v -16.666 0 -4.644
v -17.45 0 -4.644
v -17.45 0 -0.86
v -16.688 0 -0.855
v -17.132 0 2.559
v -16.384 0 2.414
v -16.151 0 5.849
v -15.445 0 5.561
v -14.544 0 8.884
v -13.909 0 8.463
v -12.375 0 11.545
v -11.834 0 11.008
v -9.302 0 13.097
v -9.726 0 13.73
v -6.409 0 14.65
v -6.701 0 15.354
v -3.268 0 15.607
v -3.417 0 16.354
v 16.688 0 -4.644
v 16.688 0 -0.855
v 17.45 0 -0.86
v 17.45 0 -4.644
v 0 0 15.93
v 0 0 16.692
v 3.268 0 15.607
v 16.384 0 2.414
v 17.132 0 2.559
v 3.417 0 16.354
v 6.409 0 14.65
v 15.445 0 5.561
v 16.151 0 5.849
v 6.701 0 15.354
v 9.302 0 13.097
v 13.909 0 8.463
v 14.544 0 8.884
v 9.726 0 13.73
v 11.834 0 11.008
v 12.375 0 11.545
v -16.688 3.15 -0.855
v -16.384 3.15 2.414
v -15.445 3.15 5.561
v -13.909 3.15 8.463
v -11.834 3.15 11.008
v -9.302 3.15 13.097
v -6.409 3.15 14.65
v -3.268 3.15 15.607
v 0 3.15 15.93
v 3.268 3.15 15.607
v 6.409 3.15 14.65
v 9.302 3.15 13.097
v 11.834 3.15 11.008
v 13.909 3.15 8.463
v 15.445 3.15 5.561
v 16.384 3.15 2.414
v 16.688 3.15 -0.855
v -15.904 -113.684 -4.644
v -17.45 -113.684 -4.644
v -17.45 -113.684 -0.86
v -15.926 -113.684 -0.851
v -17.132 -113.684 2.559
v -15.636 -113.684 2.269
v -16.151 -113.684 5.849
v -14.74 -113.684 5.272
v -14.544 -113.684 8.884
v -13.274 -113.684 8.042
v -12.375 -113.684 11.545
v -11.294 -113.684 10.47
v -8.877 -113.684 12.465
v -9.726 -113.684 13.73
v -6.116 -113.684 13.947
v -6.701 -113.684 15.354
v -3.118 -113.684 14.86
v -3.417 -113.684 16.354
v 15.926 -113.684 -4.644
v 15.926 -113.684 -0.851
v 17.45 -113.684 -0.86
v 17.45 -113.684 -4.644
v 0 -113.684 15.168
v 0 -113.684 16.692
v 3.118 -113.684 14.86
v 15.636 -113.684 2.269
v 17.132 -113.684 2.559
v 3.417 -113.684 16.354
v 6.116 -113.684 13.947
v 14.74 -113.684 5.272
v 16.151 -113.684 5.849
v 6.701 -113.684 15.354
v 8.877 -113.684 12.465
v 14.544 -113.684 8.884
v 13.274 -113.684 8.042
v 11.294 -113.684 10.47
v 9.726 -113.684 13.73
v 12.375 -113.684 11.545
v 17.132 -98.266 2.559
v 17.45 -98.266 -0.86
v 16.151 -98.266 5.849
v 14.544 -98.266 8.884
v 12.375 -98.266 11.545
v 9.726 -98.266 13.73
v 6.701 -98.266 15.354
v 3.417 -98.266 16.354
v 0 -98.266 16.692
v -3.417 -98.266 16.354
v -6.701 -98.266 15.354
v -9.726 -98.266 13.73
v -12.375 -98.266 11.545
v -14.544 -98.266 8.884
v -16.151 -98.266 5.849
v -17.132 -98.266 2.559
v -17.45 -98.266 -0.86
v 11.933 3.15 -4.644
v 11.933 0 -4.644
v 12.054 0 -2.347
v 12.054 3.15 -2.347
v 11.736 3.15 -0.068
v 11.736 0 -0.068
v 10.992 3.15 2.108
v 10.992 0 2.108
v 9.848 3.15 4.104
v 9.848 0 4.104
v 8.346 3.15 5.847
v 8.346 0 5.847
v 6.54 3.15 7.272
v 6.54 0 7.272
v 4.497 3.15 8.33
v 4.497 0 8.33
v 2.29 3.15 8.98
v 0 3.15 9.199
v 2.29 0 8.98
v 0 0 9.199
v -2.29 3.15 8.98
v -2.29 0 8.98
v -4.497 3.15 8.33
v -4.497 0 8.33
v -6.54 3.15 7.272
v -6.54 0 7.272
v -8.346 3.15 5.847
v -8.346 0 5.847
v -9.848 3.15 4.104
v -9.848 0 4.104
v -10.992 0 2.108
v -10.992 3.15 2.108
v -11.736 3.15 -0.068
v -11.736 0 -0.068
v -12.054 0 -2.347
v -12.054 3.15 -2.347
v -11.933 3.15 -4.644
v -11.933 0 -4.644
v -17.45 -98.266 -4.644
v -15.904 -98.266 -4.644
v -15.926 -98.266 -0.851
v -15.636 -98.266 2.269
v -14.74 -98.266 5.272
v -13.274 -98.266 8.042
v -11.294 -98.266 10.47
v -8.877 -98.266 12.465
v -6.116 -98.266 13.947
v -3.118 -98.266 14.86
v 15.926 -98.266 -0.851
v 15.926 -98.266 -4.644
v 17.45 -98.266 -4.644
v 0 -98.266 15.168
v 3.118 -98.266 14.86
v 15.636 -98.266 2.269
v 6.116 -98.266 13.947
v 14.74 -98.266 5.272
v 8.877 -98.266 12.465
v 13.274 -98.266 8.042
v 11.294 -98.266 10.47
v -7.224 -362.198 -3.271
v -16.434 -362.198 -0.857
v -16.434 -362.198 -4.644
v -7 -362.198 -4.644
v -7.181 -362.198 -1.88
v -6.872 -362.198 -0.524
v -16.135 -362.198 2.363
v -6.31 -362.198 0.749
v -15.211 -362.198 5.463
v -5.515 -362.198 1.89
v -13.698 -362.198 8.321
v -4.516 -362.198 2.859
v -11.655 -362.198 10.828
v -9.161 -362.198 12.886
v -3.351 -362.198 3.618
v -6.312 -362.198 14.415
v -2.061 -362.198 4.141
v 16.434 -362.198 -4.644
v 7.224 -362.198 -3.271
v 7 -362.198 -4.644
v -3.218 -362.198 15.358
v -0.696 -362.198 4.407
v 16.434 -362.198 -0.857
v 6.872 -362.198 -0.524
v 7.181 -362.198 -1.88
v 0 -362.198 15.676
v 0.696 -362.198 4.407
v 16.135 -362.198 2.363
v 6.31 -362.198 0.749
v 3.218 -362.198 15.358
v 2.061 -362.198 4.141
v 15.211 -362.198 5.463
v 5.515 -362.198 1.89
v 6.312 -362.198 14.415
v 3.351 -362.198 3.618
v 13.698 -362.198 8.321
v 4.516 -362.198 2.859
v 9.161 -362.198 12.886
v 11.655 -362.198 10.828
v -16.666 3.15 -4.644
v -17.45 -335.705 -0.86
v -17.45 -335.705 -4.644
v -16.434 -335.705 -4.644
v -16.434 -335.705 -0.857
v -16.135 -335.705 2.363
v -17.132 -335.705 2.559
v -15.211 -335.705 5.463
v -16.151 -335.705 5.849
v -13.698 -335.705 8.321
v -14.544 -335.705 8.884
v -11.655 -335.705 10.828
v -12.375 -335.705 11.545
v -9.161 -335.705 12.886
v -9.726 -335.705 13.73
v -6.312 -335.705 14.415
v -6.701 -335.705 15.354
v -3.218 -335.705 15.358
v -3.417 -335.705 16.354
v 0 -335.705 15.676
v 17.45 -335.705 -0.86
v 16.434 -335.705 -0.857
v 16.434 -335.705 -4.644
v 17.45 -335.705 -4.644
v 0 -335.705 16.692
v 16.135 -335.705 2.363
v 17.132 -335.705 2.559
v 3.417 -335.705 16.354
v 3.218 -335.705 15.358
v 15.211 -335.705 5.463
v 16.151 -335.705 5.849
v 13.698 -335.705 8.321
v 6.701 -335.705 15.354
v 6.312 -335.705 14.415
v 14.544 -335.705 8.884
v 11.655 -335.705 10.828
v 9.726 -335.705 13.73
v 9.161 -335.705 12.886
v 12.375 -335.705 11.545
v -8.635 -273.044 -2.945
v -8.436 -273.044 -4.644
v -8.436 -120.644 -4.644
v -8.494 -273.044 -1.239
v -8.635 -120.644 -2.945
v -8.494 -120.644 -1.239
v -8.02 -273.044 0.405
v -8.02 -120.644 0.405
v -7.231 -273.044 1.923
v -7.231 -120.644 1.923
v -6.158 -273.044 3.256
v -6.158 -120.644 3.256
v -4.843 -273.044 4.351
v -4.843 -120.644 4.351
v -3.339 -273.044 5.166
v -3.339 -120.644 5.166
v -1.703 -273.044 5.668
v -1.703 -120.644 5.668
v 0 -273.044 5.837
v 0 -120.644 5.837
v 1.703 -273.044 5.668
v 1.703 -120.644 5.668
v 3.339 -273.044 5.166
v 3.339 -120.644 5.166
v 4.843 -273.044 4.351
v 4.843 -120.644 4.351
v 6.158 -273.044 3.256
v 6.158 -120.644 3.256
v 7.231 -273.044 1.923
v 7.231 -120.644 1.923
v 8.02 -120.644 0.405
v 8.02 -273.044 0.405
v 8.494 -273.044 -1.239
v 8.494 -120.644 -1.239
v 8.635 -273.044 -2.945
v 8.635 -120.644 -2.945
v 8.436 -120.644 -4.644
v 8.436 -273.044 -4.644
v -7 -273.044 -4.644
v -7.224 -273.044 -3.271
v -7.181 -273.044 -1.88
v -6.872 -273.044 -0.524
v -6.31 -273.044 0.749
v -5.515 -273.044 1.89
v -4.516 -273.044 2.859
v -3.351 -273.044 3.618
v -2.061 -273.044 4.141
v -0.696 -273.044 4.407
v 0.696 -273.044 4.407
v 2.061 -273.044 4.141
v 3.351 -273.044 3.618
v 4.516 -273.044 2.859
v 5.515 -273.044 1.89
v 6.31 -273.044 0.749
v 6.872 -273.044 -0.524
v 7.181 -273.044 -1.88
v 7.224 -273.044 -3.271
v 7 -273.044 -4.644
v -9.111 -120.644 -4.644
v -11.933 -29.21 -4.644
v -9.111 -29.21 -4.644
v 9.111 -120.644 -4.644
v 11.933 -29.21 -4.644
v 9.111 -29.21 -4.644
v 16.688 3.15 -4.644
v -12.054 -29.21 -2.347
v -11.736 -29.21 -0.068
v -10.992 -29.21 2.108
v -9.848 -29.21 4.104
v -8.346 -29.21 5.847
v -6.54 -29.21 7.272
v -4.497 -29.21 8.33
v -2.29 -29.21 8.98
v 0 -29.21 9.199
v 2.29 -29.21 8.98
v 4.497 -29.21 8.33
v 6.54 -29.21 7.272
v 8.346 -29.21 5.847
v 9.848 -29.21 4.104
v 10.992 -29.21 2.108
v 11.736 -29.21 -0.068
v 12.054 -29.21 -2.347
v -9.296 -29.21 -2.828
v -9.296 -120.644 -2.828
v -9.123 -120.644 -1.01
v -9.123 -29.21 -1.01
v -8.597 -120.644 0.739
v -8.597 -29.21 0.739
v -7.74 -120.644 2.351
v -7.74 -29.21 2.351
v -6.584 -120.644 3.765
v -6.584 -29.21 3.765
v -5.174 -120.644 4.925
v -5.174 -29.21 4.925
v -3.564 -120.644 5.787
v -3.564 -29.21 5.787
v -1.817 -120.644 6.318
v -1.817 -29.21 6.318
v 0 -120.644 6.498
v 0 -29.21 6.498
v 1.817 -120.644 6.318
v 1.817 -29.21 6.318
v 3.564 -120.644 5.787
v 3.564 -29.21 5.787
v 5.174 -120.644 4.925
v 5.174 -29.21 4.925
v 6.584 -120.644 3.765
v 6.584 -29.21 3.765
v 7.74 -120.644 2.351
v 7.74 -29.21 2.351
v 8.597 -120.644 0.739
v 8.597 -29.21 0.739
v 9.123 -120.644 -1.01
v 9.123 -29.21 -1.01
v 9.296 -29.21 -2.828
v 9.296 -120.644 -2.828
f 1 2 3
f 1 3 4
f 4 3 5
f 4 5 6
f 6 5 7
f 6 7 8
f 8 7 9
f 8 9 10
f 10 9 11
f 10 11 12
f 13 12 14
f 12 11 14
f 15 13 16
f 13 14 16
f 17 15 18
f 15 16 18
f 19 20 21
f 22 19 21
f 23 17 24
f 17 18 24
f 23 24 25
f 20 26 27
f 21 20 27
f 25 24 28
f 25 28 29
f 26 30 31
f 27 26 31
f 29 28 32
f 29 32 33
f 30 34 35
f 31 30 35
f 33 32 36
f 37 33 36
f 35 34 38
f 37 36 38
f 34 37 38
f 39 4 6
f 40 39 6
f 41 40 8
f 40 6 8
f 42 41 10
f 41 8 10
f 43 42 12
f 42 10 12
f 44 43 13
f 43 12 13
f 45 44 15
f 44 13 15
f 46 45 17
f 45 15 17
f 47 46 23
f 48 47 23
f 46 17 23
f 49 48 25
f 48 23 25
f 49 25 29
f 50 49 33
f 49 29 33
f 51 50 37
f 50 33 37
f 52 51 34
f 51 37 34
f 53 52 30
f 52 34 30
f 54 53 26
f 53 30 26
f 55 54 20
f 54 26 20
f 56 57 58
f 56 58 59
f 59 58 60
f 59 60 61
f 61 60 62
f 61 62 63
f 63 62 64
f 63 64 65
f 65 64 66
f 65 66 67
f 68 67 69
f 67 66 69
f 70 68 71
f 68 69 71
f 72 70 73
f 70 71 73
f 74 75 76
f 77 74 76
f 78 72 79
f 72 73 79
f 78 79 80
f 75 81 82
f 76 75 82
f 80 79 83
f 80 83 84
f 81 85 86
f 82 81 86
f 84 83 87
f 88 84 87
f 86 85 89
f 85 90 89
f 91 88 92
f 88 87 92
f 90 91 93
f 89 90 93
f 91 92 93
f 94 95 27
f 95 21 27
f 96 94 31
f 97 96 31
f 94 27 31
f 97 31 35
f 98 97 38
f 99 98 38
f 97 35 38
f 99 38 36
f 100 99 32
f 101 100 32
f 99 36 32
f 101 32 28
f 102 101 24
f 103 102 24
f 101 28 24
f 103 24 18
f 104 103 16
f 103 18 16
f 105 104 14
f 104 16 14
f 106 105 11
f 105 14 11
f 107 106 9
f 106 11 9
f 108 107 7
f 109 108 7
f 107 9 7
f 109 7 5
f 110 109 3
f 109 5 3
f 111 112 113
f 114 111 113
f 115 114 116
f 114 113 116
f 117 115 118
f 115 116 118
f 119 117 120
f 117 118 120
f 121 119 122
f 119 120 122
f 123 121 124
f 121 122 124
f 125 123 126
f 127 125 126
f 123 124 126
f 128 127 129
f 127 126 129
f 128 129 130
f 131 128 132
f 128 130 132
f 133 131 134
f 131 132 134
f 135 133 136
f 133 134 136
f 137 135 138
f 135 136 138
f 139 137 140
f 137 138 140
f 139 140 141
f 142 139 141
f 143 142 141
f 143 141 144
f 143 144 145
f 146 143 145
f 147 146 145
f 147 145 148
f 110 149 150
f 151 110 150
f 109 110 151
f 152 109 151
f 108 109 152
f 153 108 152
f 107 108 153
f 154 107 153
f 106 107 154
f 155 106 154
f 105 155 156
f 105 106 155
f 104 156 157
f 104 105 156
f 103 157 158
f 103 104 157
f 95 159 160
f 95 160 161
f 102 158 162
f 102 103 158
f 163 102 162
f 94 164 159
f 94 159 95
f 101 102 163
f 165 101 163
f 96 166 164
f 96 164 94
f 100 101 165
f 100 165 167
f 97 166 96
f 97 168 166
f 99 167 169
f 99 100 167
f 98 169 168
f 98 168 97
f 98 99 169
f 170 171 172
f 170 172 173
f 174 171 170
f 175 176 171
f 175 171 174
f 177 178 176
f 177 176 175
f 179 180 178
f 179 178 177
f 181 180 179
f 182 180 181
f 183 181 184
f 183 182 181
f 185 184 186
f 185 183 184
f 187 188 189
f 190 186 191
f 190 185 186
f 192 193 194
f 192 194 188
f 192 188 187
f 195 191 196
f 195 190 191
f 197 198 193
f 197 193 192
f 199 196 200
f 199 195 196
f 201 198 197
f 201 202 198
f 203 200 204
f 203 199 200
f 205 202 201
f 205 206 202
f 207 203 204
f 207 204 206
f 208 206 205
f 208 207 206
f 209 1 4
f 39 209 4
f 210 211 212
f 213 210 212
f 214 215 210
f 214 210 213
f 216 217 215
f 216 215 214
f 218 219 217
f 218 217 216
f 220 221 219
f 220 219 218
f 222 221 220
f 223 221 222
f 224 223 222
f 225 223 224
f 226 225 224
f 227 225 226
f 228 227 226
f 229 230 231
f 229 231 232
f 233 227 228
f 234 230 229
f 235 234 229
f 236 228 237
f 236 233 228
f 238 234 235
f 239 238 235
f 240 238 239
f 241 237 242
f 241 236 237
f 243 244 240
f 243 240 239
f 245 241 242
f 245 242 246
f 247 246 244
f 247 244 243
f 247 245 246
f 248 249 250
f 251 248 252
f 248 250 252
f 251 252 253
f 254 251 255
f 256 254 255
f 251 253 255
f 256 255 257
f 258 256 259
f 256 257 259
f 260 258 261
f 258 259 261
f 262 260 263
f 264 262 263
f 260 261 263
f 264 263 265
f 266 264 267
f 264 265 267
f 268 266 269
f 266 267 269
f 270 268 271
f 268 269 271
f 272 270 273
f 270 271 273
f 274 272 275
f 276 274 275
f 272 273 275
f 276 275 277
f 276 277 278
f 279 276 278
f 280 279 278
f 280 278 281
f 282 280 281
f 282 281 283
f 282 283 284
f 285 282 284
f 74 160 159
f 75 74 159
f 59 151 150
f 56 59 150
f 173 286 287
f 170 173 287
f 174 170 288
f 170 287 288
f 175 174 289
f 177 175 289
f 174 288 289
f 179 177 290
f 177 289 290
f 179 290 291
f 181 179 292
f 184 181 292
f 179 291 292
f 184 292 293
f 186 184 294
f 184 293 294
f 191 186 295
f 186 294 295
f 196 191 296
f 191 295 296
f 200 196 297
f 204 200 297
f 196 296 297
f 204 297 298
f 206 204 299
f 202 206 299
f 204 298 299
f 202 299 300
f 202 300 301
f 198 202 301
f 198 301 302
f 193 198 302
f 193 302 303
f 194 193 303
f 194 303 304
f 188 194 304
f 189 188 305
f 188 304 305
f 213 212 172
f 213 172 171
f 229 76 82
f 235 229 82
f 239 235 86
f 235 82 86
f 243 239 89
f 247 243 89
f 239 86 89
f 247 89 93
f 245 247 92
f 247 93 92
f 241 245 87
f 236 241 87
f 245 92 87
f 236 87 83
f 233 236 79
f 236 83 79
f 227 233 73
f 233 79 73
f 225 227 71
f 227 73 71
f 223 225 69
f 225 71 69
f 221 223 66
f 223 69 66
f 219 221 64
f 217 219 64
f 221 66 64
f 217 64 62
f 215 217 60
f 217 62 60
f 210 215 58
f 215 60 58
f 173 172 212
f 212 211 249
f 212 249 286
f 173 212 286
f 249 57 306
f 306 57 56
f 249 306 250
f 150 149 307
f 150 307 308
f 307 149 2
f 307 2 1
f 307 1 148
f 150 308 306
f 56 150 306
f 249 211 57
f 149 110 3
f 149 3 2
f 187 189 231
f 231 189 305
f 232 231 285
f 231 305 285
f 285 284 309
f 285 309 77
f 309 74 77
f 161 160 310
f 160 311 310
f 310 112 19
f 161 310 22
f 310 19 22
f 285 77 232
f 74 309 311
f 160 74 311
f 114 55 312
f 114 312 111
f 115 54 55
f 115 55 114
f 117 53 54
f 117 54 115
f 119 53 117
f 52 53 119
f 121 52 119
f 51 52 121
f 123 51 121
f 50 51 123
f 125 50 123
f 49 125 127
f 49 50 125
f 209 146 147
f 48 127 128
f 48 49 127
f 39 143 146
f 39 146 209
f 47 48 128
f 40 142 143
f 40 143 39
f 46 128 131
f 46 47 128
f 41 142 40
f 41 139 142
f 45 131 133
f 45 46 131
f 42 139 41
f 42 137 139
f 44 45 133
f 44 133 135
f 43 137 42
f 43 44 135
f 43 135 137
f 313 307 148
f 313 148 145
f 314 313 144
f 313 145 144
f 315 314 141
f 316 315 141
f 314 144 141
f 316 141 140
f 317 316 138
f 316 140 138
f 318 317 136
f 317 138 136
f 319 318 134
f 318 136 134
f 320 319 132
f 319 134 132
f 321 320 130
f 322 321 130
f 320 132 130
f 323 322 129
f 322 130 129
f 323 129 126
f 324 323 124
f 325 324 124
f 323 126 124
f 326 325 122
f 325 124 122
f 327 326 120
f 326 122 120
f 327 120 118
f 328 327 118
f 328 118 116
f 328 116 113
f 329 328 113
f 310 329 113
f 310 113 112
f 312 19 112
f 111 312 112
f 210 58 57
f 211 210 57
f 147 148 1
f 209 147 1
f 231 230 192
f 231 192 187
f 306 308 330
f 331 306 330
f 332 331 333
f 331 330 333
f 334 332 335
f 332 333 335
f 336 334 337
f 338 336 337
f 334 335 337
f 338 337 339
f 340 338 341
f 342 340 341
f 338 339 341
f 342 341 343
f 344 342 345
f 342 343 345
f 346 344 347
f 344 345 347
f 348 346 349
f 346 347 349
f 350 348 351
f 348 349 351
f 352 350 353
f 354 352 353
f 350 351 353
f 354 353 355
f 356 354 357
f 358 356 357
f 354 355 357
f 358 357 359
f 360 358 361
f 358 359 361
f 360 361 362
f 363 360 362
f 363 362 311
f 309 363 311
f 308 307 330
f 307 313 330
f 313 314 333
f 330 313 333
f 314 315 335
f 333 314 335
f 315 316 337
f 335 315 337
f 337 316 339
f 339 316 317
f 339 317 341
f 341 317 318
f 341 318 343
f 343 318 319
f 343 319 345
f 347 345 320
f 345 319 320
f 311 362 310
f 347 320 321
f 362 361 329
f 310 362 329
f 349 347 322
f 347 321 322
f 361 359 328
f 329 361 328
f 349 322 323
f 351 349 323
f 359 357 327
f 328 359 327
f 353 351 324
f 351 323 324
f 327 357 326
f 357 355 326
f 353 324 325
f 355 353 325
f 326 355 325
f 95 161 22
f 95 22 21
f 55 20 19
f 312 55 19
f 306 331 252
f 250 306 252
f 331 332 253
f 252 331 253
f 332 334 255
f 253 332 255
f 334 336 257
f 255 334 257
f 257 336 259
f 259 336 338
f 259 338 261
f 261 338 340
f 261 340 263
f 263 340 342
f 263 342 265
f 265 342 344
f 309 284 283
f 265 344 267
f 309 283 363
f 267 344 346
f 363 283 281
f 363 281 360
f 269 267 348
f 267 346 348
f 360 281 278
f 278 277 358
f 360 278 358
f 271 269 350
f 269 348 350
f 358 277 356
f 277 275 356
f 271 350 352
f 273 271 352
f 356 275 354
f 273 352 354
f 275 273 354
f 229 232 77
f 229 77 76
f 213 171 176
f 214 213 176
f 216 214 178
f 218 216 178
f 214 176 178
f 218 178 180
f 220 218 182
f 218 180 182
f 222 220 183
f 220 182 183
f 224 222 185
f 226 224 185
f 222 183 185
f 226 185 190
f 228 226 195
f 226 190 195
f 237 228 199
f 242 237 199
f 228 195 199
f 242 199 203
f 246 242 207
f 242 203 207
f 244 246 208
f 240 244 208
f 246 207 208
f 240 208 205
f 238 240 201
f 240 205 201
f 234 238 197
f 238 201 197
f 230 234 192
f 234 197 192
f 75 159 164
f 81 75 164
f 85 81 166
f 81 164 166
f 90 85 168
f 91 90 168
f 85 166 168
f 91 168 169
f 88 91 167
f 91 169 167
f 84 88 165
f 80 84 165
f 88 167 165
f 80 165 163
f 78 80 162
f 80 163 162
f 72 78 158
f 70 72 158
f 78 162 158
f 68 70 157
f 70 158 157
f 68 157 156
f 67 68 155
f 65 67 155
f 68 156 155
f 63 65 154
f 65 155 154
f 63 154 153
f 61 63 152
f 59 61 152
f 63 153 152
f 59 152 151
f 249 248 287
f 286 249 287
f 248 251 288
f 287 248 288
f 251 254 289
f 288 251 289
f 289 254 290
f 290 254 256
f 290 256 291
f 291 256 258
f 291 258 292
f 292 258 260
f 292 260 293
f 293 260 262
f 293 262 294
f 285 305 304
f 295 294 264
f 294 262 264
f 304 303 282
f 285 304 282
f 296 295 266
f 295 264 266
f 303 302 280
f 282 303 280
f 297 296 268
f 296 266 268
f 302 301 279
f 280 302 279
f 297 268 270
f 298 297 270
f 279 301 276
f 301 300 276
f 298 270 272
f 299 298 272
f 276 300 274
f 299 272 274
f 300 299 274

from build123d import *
from build123d import SkipClean  # not in build123d's __all__

# Parameters (mm, degrees)
F1_DEPTH  = 29.21
F3_DEPTH  = 69.05625
F5_DEPTH  = 15.4178
F7_DEPTH  = 6.9596
F9_DEPTH  = 152.4
F11_DEPTH = 89.154
F13_DEPTH = 26.4922
F15_DEPTH = 3.1496


with BuildPart() as f1:
    # F0 (on Front) → F1 (new body)
    with BuildSketch(Plane.XZ):
        with BuildLine():
            Line((11.9332703397, -4.6441399077), (17.4498, -4.6441399077))
            Line((17.4498, -4.6441399077), (17.4498, -0.8595399077))
            ThreePointArc((17.4498, -0.8595399077), (0, 16.6918600923), (-17.4498, -0.8595399077))
            Line((-17.4498, -0.8595399077), (-17.4498, -4.6441399077))
            Line((-17.4498, -4.6441399077), (-11.9332703397, -4.6441399077))
            ThreePointArc((-11.9332703397, -4.6441399077), (0, 9.1988600923), (11.9332703397, -4.6441399077))
        make_face()
    extrude(amount=F1_DEPTH)

    # F2 (on face) → F3 (join)
    with BuildSketch(Plane.XZ.offset(29.21)):
        with BuildLine():
            ThreePointArc((-9.1113708093, -4.6441399077), (0, 6.4977884545), (9.1113708093, -4.6441399077))
            Line((9.1113708093, -4.6441399077), (11.9332703397, -4.6441399077))
            ThreePointArc((11.9332703397, -4.6441399077), (0, 9.1988600923), (-11.9332703397, -4.6441399077))
            Line((-11.9332703397, -4.6441399077), (-9.1113708093, -4.6441399077))
        make_face()
        with BuildLine():
            ThreePointArc((-11.9332703397, -4.6441399077), (0, 9.1988600923), (11.9332703397, -4.6441399077))
            Line((11.9332703397, -4.6441399077), (17.4498, -4.6441399077))
            Line((17.4498, -4.6441399077), (17.4498, -0.8595399077))
            ThreePointArc((17.4498, -0.8595399077), (0, 16.6918600923), (-17.4498, -0.8595399077))
            Line((-17.4498, -0.8595399077), (-17.4498, -4.6441399077))
            Line((-17.4498, -4.6441399077), (-11.9332703397, -4.6441399077))
        make_face()
    extrude(amount=F3_DEPTH)

    # F4 (on face) → F5 (join)
    with BuildSketch(Plane.XZ.offset(98.26625)):
        with BuildLine():
            Line((15.9258256822, -4.6441399077), (15.9258256822, -0.850692377))
            ThreePointArc((15.9258256822, -0.850692377), (0, 15.1678600923), (-15.9258256822, -0.850692377))
            Line((-15.9258256822, -0.850692377), (-15.9038025792, -4.6441399077))
            Line((-15.9038025792, -4.6441399077), (-9.1113708093, -4.6441399077))
            ThreePointArc((-9.1113708093, -4.6441399077), (0, 6.4977884545), (9.1113708093, -4.6441399077))
            Line((9.1113708093, -4.6441399077), (15.9258256822, -4.6441399077))
        make_face()
    extrude(amount=F5_DEPTH)

    # F6 (on face) → F7 (join)
    with BuildSketch(Plane.XZ.offset(113.68405)):
        with BuildLine():
            ThreePointArc((-9.1113708093, -4.6441399077), (0, 6.4977884545), (9.1113708093, -4.6441399077))
            Line((9.1113708093, -4.6441399077), (15.9258256822, -4.6441399077))
            Line((15.9258256822, -4.6441399077), (15.9258256822, -0.850692377))
            ThreePointArc((15.9258256822, -0.850692377), (0, 15.1678600923), (-15.9258256822, -0.850692377))
            Line((-15.9258256822, -0.850692377), (-15.9038025792, -4.6441399077))
            Line((-15.9038025792, -4.6441399077), (-9.1113708093, -4.6441399077))
        make_face()
        with BuildLine():
            Line((15.9258256822, -0.850692377), (15.9258256822, -4.6441399077))
            Line((15.9258256822, -4.6441399077), (17.4498, -4.6441399077))
            Line((17.4498, -4.6441399077), (17.4498, -0.8595399077))
            ThreePointArc((17.4498, -0.8595399077), (0, 16.6918600923), (-17.4498, -0.8595399077))
            Line((-17.4498, -0.8595399077), (-17.4498, -4.6441399077))
            Line((-17.4498, -4.6441399077), (-15.9038025792, -4.6441399077))
            Line((-15.9038025792, -4.6441399077), (-15.9258256822, -0.850692377))
            ThreePointArc((-15.9258256822, -0.850692377), (0, 15.1678600923), (15.9258256822, -0.850692377))
        make_face()
    extrude(amount=F7_DEPTH)

    # F8 (on face) → F9 (join)
    with BuildSketch(Plane.XZ.offset(120.64365)):
        with BuildLine():
            ThreePointArc((17.4498, -0.8595399077), (0, 16.6918600923), (-17.4498, -0.8595399077))
            Line((-17.4498, -0.8595399077), (-17.4498, -4.6441399077))
            Line((-17.4498, -4.6441399077), (-9.1113708093, -4.6441399077))
            ThreePointArc((-9.1113708093, -4.6441399077), (0, 6.4977884545), (9.1113708093, -4.6441399077))
            Line((9.1113708093, -4.6441399077), (17.4498, -4.6441399077))
            Line((17.4498, -4.6441399077), (17.4498, -0.8595399077))
        make_face()
        with BuildLine():
            ThreePointArc((9.1113708093, -4.6441399077), (0, 6.4977884545), (-9.1113708093, -4.6441399077))
            Line((-9.1113708093, -4.6441399077), (-8.4364993371, -4.6441399077))
            ThreePointArc((-8.4364993371, -4.6441399077), (0, 5.8373884545), (8.4364993371, -4.6441399077))
            Line((8.4364993371, -4.6441399077), (9.1113708093, -4.6441399077))
        make_face()
    extrude(amount=F9_DEPTH)

    # F10 (on face) → F11 (join)
    with BuildSketch(Plane.XZ.offset(273.04365)):
        with BuildLine():
            ThreePointArc((17.4498, -0.8595399077), (0, 16.6918600923), (-17.4498, -0.8595399077))
            Line((-17.4498, -0.8595399077), (-17.4498, -4.6441399077))
            Line((-17.4498, -4.6441399077), (-8.4364993371, -4.6441399077))
            ThreePointArc((-8.4364993371, -4.6441399077), (0, 5.8373884545), (8.4364993371, -4.6441399077))
            Line((8.4364993371, -4.6441399077), (17.4498, -4.6441399077))
            Line((17.4498, -4.6441399077), (17.4498, -0.8595399077))
        make_face()
        with BuildLine():
            ThreePointArc((8.4364993371, -4.6441399077), (0, 5.8373884545), (-8.4364993371, -4.6441399077))
            Line((-8.4364993371, -4.6441399077), (-6.9997961445, -4.6441399077))
            ThreePointArc((-6.9997961445, -4.6441399077), (0, 4.4403884545), (6.9997961445, -4.6441399077))
            Line((6.9997961445, -4.6441399077), (8.4364993371, -4.6441399077))
        make_face()
    extrude(amount=F11_DEPTH)

    # F12 (on face) → F13 (cut)
    with BuildSketch(Plane.XZ.offset(362.19765)):
        with BuildLine():
            ThreePointArc((-16.4338, -0.8565464804), (0, 15.6758600923), (16.4338, -0.8565464805))
            Line((16.4338, -0.8565464805), (16.4338, -4.6441399077))
            Line((16.4338, -4.6441399077), (17.4498, -4.6441399077))
            Line((17.4498, -4.6441399077), (17.4498, -0.8595399077))
            ThreePointArc((17.4498, -0.8595399077), (0, 16.6918600923), (-17.4498, -0.8595399077))
            Line((-17.4498, -0.8595399077), (-17.4498, -4.6441399077))
            Line((-17.4498, -4.6441399077), (-16.4338, -4.6441399077))
            Line((-16.4338, -4.6441399077), (-16.4338, -0.8565464804))
        make_face()
    extrude(amount=-F13_DEPTH, mode=Mode.SUBTRACT)

    # F14 (on face) → F15 (join)
    with BuildSketch(Plane(origin=(0, 0, 0), x_dir=(-1, 0, 0), z_dir=(0, 1, 0))):
        with BuildLine():
            ThreePointArc((16.6878128411, -0.8551161423), (0, 15.9298600923), (-16.6878128411, -0.8551161423))
            Line((-16.6878128411, -0.8551161423), (-16.6878128411, -4.6441399077))
            Line((-16.6878128411, -4.6441399077), (-11.9332703397, -4.6441399077))
            ThreePointArc((-11.9332703397, -4.6441399077), (0, 9.1988600923), (11.9332703397, -4.6441399077))
            Line((11.9332703397, -4.6441399077), (16.6658154206, -4.6441399077))
            Line((16.6658154206, -4.6441399077), (16.6878128411, -0.8551161423))
        make_face()
    with SkipClean():  # cleaning this boolean's faces spoils the solid; the shape is the same uncleaned
        extrude(amount=F15_DEPTH)


solid = f1.part
